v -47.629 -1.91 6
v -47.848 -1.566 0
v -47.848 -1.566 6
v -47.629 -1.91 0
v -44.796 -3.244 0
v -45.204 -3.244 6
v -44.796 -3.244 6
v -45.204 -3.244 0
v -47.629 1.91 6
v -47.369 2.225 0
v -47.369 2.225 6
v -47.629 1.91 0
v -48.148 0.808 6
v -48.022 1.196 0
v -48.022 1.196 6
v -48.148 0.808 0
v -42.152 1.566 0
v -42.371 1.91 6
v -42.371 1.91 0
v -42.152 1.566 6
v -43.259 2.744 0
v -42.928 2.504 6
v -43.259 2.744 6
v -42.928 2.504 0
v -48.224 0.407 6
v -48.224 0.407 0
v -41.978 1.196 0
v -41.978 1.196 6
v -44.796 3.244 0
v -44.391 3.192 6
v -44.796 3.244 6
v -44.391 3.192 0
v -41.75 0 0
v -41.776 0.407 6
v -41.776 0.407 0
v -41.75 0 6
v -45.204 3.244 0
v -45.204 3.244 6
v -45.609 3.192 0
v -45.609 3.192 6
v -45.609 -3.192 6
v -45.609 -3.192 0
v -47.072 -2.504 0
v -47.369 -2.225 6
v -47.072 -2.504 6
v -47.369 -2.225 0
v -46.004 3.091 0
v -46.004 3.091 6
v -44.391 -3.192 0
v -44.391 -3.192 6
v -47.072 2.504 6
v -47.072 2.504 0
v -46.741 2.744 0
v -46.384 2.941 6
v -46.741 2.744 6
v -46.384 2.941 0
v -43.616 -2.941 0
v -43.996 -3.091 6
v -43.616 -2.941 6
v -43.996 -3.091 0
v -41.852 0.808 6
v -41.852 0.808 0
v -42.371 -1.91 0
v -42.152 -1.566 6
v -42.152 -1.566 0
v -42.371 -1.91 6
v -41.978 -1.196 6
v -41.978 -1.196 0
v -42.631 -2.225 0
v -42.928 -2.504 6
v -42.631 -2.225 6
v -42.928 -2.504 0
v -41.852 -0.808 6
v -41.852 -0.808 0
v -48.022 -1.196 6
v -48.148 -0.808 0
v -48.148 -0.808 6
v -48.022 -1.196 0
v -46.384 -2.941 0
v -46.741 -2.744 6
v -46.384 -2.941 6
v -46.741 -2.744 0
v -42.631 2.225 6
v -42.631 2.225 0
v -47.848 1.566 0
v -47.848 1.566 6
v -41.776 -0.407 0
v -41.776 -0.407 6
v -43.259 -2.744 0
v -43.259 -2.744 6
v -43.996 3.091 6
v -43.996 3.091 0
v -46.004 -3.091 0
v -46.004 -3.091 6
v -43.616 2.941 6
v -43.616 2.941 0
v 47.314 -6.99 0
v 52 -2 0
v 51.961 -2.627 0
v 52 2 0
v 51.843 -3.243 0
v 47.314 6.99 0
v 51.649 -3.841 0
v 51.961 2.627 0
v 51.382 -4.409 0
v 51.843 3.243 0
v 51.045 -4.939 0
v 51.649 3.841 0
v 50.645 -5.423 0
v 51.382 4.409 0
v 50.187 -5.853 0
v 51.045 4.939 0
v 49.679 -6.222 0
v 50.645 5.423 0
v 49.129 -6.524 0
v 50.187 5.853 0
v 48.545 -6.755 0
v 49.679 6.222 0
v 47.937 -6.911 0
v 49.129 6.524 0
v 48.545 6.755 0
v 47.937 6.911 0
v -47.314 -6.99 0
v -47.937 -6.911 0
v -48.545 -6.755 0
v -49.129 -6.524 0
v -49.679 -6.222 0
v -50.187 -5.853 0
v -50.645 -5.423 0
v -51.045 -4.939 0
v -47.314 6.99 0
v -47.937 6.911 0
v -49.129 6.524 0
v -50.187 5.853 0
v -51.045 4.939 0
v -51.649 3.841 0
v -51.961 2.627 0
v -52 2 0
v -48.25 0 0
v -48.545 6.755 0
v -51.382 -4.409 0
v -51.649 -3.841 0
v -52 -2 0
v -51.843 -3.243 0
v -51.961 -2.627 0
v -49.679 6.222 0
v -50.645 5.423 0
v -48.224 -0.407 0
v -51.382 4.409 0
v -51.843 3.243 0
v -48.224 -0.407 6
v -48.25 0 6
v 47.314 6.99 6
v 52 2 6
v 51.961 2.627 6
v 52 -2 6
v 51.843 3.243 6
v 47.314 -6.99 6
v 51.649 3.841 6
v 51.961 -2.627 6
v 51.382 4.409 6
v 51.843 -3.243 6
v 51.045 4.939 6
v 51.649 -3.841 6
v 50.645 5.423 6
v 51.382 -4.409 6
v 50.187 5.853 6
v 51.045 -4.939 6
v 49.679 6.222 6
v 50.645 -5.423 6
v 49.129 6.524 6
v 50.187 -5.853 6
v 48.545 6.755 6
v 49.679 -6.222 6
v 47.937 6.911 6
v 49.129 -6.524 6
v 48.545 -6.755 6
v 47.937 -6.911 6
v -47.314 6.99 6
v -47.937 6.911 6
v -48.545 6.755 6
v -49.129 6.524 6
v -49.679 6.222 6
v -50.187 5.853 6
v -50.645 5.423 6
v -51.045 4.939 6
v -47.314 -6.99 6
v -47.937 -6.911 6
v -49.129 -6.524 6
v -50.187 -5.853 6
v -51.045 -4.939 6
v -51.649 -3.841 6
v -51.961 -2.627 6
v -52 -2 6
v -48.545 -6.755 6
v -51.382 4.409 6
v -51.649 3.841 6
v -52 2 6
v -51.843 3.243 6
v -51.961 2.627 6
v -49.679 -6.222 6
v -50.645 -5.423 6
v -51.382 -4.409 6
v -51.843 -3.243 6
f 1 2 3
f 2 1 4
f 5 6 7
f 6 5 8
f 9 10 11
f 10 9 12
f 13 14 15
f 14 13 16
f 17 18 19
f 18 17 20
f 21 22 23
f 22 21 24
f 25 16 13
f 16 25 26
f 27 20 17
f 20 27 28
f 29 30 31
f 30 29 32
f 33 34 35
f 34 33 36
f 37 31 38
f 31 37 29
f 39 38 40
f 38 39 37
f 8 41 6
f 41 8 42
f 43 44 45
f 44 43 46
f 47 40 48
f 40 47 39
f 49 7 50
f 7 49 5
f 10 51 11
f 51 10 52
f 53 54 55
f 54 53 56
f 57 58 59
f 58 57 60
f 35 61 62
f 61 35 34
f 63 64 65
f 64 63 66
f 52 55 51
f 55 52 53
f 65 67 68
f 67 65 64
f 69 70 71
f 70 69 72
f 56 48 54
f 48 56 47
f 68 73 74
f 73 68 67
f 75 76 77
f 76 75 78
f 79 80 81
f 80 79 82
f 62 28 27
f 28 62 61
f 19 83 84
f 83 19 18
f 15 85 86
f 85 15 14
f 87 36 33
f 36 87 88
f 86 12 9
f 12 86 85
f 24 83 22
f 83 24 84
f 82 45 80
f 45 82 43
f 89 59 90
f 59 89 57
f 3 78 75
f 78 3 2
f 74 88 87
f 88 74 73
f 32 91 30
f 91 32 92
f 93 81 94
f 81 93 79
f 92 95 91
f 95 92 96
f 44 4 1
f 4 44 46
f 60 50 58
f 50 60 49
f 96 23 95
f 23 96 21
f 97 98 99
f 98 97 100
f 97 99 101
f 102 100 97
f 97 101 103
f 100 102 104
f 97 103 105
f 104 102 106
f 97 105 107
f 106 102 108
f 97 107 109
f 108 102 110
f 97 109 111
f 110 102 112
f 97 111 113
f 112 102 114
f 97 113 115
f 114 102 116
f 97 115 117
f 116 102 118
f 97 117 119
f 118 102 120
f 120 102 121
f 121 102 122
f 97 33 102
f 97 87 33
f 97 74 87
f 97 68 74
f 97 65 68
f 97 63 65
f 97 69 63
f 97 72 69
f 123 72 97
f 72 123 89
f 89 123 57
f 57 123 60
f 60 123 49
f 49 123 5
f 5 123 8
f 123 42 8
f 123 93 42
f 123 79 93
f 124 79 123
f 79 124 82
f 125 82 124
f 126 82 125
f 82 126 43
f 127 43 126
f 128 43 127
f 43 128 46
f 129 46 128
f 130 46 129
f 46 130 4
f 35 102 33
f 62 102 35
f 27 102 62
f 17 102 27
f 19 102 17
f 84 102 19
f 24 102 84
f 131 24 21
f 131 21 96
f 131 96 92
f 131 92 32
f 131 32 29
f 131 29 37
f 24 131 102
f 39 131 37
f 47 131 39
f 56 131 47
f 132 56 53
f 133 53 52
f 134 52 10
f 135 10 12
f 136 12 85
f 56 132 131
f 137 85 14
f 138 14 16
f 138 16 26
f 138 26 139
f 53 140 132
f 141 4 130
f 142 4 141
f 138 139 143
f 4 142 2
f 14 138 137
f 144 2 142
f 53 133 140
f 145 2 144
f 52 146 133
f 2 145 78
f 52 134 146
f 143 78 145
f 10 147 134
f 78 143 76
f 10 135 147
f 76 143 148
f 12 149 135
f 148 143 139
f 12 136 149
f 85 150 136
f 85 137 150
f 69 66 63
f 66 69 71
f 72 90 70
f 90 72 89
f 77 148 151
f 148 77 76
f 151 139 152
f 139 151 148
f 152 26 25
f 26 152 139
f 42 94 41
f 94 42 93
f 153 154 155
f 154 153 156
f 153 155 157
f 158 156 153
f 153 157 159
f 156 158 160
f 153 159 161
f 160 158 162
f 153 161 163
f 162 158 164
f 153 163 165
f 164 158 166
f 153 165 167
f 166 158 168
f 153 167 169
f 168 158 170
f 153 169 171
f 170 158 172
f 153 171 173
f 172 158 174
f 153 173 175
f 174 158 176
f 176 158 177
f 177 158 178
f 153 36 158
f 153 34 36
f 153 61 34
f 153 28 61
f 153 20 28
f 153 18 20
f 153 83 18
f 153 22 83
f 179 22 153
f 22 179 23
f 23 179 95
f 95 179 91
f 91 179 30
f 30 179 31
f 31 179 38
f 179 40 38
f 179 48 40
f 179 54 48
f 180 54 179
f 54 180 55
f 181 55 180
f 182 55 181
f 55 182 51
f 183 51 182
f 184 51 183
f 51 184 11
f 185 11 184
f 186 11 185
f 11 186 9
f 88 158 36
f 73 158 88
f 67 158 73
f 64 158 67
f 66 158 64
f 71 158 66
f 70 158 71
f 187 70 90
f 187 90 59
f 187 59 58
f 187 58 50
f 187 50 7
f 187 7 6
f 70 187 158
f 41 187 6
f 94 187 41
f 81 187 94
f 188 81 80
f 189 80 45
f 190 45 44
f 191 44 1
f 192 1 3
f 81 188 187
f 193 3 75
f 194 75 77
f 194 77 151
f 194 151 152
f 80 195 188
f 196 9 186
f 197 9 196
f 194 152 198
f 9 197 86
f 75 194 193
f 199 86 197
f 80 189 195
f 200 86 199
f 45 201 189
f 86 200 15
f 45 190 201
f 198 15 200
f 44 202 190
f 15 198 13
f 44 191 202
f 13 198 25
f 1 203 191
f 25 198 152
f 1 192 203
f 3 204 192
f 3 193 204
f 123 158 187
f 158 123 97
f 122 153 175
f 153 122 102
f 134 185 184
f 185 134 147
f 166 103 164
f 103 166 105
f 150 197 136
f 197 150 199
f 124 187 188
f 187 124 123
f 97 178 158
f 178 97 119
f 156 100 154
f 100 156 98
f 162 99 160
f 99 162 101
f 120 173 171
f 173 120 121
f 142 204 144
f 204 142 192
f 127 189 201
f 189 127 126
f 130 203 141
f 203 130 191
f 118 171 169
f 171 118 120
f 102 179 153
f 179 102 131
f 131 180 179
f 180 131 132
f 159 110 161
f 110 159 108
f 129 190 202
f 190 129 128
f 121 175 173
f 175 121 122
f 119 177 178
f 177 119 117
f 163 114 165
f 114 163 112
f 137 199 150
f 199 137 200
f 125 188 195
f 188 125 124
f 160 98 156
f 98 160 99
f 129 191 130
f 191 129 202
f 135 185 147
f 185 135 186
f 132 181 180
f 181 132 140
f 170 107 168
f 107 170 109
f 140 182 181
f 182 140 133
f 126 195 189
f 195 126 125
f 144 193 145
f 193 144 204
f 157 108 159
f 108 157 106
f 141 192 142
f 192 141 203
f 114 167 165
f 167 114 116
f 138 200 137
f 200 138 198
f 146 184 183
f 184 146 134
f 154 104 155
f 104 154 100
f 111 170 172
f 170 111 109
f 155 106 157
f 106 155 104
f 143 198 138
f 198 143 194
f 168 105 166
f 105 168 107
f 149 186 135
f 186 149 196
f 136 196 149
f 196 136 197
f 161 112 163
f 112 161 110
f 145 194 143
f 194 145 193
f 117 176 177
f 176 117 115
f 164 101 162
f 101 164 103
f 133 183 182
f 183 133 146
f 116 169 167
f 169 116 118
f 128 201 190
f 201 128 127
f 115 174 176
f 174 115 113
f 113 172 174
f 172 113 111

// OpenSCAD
$fn = 50;


difference() {
	union() {
		hull() {
			translate(v = [-47.0000000000, 2.0000000000, 0]) {
				cylinder(h = 6, r = 5);
			}
			translate(v = [47.0000000000, 2.0000000000, 0]) {
				cylinder(h = 6, r = 5);
			}
			translate(v = [-47.0000000000, -2.0000000000, 0]) {
				cylinder(h = 6, r = 5);
			}
			translate(v = [47.0000000000, -2.0000000000, 0]) {
				cylinder(h = 6, r = 5);
			}
		}
	}
	union() {
		translate(v = [-45.0000000000, 0.0000000000, 0]) {
			cylinder(h = 6, r = 3.2500000000);
		}
		translate(v = [-45.0000000000, 0.0000000000, 0]) {
			cylinder(h = 6, r = 1.8000000000);
		}
		translate(v = [-45.0000000000, 0.0000000000, 0]) {
			cylinder(h = 6, r = 1.8000000000);
		}
		translate(v = [-45.0000000000, 0.0000000000, 0]) {
			cylinder(h = 6, r = 1.8000000000);
		}
	}
}
